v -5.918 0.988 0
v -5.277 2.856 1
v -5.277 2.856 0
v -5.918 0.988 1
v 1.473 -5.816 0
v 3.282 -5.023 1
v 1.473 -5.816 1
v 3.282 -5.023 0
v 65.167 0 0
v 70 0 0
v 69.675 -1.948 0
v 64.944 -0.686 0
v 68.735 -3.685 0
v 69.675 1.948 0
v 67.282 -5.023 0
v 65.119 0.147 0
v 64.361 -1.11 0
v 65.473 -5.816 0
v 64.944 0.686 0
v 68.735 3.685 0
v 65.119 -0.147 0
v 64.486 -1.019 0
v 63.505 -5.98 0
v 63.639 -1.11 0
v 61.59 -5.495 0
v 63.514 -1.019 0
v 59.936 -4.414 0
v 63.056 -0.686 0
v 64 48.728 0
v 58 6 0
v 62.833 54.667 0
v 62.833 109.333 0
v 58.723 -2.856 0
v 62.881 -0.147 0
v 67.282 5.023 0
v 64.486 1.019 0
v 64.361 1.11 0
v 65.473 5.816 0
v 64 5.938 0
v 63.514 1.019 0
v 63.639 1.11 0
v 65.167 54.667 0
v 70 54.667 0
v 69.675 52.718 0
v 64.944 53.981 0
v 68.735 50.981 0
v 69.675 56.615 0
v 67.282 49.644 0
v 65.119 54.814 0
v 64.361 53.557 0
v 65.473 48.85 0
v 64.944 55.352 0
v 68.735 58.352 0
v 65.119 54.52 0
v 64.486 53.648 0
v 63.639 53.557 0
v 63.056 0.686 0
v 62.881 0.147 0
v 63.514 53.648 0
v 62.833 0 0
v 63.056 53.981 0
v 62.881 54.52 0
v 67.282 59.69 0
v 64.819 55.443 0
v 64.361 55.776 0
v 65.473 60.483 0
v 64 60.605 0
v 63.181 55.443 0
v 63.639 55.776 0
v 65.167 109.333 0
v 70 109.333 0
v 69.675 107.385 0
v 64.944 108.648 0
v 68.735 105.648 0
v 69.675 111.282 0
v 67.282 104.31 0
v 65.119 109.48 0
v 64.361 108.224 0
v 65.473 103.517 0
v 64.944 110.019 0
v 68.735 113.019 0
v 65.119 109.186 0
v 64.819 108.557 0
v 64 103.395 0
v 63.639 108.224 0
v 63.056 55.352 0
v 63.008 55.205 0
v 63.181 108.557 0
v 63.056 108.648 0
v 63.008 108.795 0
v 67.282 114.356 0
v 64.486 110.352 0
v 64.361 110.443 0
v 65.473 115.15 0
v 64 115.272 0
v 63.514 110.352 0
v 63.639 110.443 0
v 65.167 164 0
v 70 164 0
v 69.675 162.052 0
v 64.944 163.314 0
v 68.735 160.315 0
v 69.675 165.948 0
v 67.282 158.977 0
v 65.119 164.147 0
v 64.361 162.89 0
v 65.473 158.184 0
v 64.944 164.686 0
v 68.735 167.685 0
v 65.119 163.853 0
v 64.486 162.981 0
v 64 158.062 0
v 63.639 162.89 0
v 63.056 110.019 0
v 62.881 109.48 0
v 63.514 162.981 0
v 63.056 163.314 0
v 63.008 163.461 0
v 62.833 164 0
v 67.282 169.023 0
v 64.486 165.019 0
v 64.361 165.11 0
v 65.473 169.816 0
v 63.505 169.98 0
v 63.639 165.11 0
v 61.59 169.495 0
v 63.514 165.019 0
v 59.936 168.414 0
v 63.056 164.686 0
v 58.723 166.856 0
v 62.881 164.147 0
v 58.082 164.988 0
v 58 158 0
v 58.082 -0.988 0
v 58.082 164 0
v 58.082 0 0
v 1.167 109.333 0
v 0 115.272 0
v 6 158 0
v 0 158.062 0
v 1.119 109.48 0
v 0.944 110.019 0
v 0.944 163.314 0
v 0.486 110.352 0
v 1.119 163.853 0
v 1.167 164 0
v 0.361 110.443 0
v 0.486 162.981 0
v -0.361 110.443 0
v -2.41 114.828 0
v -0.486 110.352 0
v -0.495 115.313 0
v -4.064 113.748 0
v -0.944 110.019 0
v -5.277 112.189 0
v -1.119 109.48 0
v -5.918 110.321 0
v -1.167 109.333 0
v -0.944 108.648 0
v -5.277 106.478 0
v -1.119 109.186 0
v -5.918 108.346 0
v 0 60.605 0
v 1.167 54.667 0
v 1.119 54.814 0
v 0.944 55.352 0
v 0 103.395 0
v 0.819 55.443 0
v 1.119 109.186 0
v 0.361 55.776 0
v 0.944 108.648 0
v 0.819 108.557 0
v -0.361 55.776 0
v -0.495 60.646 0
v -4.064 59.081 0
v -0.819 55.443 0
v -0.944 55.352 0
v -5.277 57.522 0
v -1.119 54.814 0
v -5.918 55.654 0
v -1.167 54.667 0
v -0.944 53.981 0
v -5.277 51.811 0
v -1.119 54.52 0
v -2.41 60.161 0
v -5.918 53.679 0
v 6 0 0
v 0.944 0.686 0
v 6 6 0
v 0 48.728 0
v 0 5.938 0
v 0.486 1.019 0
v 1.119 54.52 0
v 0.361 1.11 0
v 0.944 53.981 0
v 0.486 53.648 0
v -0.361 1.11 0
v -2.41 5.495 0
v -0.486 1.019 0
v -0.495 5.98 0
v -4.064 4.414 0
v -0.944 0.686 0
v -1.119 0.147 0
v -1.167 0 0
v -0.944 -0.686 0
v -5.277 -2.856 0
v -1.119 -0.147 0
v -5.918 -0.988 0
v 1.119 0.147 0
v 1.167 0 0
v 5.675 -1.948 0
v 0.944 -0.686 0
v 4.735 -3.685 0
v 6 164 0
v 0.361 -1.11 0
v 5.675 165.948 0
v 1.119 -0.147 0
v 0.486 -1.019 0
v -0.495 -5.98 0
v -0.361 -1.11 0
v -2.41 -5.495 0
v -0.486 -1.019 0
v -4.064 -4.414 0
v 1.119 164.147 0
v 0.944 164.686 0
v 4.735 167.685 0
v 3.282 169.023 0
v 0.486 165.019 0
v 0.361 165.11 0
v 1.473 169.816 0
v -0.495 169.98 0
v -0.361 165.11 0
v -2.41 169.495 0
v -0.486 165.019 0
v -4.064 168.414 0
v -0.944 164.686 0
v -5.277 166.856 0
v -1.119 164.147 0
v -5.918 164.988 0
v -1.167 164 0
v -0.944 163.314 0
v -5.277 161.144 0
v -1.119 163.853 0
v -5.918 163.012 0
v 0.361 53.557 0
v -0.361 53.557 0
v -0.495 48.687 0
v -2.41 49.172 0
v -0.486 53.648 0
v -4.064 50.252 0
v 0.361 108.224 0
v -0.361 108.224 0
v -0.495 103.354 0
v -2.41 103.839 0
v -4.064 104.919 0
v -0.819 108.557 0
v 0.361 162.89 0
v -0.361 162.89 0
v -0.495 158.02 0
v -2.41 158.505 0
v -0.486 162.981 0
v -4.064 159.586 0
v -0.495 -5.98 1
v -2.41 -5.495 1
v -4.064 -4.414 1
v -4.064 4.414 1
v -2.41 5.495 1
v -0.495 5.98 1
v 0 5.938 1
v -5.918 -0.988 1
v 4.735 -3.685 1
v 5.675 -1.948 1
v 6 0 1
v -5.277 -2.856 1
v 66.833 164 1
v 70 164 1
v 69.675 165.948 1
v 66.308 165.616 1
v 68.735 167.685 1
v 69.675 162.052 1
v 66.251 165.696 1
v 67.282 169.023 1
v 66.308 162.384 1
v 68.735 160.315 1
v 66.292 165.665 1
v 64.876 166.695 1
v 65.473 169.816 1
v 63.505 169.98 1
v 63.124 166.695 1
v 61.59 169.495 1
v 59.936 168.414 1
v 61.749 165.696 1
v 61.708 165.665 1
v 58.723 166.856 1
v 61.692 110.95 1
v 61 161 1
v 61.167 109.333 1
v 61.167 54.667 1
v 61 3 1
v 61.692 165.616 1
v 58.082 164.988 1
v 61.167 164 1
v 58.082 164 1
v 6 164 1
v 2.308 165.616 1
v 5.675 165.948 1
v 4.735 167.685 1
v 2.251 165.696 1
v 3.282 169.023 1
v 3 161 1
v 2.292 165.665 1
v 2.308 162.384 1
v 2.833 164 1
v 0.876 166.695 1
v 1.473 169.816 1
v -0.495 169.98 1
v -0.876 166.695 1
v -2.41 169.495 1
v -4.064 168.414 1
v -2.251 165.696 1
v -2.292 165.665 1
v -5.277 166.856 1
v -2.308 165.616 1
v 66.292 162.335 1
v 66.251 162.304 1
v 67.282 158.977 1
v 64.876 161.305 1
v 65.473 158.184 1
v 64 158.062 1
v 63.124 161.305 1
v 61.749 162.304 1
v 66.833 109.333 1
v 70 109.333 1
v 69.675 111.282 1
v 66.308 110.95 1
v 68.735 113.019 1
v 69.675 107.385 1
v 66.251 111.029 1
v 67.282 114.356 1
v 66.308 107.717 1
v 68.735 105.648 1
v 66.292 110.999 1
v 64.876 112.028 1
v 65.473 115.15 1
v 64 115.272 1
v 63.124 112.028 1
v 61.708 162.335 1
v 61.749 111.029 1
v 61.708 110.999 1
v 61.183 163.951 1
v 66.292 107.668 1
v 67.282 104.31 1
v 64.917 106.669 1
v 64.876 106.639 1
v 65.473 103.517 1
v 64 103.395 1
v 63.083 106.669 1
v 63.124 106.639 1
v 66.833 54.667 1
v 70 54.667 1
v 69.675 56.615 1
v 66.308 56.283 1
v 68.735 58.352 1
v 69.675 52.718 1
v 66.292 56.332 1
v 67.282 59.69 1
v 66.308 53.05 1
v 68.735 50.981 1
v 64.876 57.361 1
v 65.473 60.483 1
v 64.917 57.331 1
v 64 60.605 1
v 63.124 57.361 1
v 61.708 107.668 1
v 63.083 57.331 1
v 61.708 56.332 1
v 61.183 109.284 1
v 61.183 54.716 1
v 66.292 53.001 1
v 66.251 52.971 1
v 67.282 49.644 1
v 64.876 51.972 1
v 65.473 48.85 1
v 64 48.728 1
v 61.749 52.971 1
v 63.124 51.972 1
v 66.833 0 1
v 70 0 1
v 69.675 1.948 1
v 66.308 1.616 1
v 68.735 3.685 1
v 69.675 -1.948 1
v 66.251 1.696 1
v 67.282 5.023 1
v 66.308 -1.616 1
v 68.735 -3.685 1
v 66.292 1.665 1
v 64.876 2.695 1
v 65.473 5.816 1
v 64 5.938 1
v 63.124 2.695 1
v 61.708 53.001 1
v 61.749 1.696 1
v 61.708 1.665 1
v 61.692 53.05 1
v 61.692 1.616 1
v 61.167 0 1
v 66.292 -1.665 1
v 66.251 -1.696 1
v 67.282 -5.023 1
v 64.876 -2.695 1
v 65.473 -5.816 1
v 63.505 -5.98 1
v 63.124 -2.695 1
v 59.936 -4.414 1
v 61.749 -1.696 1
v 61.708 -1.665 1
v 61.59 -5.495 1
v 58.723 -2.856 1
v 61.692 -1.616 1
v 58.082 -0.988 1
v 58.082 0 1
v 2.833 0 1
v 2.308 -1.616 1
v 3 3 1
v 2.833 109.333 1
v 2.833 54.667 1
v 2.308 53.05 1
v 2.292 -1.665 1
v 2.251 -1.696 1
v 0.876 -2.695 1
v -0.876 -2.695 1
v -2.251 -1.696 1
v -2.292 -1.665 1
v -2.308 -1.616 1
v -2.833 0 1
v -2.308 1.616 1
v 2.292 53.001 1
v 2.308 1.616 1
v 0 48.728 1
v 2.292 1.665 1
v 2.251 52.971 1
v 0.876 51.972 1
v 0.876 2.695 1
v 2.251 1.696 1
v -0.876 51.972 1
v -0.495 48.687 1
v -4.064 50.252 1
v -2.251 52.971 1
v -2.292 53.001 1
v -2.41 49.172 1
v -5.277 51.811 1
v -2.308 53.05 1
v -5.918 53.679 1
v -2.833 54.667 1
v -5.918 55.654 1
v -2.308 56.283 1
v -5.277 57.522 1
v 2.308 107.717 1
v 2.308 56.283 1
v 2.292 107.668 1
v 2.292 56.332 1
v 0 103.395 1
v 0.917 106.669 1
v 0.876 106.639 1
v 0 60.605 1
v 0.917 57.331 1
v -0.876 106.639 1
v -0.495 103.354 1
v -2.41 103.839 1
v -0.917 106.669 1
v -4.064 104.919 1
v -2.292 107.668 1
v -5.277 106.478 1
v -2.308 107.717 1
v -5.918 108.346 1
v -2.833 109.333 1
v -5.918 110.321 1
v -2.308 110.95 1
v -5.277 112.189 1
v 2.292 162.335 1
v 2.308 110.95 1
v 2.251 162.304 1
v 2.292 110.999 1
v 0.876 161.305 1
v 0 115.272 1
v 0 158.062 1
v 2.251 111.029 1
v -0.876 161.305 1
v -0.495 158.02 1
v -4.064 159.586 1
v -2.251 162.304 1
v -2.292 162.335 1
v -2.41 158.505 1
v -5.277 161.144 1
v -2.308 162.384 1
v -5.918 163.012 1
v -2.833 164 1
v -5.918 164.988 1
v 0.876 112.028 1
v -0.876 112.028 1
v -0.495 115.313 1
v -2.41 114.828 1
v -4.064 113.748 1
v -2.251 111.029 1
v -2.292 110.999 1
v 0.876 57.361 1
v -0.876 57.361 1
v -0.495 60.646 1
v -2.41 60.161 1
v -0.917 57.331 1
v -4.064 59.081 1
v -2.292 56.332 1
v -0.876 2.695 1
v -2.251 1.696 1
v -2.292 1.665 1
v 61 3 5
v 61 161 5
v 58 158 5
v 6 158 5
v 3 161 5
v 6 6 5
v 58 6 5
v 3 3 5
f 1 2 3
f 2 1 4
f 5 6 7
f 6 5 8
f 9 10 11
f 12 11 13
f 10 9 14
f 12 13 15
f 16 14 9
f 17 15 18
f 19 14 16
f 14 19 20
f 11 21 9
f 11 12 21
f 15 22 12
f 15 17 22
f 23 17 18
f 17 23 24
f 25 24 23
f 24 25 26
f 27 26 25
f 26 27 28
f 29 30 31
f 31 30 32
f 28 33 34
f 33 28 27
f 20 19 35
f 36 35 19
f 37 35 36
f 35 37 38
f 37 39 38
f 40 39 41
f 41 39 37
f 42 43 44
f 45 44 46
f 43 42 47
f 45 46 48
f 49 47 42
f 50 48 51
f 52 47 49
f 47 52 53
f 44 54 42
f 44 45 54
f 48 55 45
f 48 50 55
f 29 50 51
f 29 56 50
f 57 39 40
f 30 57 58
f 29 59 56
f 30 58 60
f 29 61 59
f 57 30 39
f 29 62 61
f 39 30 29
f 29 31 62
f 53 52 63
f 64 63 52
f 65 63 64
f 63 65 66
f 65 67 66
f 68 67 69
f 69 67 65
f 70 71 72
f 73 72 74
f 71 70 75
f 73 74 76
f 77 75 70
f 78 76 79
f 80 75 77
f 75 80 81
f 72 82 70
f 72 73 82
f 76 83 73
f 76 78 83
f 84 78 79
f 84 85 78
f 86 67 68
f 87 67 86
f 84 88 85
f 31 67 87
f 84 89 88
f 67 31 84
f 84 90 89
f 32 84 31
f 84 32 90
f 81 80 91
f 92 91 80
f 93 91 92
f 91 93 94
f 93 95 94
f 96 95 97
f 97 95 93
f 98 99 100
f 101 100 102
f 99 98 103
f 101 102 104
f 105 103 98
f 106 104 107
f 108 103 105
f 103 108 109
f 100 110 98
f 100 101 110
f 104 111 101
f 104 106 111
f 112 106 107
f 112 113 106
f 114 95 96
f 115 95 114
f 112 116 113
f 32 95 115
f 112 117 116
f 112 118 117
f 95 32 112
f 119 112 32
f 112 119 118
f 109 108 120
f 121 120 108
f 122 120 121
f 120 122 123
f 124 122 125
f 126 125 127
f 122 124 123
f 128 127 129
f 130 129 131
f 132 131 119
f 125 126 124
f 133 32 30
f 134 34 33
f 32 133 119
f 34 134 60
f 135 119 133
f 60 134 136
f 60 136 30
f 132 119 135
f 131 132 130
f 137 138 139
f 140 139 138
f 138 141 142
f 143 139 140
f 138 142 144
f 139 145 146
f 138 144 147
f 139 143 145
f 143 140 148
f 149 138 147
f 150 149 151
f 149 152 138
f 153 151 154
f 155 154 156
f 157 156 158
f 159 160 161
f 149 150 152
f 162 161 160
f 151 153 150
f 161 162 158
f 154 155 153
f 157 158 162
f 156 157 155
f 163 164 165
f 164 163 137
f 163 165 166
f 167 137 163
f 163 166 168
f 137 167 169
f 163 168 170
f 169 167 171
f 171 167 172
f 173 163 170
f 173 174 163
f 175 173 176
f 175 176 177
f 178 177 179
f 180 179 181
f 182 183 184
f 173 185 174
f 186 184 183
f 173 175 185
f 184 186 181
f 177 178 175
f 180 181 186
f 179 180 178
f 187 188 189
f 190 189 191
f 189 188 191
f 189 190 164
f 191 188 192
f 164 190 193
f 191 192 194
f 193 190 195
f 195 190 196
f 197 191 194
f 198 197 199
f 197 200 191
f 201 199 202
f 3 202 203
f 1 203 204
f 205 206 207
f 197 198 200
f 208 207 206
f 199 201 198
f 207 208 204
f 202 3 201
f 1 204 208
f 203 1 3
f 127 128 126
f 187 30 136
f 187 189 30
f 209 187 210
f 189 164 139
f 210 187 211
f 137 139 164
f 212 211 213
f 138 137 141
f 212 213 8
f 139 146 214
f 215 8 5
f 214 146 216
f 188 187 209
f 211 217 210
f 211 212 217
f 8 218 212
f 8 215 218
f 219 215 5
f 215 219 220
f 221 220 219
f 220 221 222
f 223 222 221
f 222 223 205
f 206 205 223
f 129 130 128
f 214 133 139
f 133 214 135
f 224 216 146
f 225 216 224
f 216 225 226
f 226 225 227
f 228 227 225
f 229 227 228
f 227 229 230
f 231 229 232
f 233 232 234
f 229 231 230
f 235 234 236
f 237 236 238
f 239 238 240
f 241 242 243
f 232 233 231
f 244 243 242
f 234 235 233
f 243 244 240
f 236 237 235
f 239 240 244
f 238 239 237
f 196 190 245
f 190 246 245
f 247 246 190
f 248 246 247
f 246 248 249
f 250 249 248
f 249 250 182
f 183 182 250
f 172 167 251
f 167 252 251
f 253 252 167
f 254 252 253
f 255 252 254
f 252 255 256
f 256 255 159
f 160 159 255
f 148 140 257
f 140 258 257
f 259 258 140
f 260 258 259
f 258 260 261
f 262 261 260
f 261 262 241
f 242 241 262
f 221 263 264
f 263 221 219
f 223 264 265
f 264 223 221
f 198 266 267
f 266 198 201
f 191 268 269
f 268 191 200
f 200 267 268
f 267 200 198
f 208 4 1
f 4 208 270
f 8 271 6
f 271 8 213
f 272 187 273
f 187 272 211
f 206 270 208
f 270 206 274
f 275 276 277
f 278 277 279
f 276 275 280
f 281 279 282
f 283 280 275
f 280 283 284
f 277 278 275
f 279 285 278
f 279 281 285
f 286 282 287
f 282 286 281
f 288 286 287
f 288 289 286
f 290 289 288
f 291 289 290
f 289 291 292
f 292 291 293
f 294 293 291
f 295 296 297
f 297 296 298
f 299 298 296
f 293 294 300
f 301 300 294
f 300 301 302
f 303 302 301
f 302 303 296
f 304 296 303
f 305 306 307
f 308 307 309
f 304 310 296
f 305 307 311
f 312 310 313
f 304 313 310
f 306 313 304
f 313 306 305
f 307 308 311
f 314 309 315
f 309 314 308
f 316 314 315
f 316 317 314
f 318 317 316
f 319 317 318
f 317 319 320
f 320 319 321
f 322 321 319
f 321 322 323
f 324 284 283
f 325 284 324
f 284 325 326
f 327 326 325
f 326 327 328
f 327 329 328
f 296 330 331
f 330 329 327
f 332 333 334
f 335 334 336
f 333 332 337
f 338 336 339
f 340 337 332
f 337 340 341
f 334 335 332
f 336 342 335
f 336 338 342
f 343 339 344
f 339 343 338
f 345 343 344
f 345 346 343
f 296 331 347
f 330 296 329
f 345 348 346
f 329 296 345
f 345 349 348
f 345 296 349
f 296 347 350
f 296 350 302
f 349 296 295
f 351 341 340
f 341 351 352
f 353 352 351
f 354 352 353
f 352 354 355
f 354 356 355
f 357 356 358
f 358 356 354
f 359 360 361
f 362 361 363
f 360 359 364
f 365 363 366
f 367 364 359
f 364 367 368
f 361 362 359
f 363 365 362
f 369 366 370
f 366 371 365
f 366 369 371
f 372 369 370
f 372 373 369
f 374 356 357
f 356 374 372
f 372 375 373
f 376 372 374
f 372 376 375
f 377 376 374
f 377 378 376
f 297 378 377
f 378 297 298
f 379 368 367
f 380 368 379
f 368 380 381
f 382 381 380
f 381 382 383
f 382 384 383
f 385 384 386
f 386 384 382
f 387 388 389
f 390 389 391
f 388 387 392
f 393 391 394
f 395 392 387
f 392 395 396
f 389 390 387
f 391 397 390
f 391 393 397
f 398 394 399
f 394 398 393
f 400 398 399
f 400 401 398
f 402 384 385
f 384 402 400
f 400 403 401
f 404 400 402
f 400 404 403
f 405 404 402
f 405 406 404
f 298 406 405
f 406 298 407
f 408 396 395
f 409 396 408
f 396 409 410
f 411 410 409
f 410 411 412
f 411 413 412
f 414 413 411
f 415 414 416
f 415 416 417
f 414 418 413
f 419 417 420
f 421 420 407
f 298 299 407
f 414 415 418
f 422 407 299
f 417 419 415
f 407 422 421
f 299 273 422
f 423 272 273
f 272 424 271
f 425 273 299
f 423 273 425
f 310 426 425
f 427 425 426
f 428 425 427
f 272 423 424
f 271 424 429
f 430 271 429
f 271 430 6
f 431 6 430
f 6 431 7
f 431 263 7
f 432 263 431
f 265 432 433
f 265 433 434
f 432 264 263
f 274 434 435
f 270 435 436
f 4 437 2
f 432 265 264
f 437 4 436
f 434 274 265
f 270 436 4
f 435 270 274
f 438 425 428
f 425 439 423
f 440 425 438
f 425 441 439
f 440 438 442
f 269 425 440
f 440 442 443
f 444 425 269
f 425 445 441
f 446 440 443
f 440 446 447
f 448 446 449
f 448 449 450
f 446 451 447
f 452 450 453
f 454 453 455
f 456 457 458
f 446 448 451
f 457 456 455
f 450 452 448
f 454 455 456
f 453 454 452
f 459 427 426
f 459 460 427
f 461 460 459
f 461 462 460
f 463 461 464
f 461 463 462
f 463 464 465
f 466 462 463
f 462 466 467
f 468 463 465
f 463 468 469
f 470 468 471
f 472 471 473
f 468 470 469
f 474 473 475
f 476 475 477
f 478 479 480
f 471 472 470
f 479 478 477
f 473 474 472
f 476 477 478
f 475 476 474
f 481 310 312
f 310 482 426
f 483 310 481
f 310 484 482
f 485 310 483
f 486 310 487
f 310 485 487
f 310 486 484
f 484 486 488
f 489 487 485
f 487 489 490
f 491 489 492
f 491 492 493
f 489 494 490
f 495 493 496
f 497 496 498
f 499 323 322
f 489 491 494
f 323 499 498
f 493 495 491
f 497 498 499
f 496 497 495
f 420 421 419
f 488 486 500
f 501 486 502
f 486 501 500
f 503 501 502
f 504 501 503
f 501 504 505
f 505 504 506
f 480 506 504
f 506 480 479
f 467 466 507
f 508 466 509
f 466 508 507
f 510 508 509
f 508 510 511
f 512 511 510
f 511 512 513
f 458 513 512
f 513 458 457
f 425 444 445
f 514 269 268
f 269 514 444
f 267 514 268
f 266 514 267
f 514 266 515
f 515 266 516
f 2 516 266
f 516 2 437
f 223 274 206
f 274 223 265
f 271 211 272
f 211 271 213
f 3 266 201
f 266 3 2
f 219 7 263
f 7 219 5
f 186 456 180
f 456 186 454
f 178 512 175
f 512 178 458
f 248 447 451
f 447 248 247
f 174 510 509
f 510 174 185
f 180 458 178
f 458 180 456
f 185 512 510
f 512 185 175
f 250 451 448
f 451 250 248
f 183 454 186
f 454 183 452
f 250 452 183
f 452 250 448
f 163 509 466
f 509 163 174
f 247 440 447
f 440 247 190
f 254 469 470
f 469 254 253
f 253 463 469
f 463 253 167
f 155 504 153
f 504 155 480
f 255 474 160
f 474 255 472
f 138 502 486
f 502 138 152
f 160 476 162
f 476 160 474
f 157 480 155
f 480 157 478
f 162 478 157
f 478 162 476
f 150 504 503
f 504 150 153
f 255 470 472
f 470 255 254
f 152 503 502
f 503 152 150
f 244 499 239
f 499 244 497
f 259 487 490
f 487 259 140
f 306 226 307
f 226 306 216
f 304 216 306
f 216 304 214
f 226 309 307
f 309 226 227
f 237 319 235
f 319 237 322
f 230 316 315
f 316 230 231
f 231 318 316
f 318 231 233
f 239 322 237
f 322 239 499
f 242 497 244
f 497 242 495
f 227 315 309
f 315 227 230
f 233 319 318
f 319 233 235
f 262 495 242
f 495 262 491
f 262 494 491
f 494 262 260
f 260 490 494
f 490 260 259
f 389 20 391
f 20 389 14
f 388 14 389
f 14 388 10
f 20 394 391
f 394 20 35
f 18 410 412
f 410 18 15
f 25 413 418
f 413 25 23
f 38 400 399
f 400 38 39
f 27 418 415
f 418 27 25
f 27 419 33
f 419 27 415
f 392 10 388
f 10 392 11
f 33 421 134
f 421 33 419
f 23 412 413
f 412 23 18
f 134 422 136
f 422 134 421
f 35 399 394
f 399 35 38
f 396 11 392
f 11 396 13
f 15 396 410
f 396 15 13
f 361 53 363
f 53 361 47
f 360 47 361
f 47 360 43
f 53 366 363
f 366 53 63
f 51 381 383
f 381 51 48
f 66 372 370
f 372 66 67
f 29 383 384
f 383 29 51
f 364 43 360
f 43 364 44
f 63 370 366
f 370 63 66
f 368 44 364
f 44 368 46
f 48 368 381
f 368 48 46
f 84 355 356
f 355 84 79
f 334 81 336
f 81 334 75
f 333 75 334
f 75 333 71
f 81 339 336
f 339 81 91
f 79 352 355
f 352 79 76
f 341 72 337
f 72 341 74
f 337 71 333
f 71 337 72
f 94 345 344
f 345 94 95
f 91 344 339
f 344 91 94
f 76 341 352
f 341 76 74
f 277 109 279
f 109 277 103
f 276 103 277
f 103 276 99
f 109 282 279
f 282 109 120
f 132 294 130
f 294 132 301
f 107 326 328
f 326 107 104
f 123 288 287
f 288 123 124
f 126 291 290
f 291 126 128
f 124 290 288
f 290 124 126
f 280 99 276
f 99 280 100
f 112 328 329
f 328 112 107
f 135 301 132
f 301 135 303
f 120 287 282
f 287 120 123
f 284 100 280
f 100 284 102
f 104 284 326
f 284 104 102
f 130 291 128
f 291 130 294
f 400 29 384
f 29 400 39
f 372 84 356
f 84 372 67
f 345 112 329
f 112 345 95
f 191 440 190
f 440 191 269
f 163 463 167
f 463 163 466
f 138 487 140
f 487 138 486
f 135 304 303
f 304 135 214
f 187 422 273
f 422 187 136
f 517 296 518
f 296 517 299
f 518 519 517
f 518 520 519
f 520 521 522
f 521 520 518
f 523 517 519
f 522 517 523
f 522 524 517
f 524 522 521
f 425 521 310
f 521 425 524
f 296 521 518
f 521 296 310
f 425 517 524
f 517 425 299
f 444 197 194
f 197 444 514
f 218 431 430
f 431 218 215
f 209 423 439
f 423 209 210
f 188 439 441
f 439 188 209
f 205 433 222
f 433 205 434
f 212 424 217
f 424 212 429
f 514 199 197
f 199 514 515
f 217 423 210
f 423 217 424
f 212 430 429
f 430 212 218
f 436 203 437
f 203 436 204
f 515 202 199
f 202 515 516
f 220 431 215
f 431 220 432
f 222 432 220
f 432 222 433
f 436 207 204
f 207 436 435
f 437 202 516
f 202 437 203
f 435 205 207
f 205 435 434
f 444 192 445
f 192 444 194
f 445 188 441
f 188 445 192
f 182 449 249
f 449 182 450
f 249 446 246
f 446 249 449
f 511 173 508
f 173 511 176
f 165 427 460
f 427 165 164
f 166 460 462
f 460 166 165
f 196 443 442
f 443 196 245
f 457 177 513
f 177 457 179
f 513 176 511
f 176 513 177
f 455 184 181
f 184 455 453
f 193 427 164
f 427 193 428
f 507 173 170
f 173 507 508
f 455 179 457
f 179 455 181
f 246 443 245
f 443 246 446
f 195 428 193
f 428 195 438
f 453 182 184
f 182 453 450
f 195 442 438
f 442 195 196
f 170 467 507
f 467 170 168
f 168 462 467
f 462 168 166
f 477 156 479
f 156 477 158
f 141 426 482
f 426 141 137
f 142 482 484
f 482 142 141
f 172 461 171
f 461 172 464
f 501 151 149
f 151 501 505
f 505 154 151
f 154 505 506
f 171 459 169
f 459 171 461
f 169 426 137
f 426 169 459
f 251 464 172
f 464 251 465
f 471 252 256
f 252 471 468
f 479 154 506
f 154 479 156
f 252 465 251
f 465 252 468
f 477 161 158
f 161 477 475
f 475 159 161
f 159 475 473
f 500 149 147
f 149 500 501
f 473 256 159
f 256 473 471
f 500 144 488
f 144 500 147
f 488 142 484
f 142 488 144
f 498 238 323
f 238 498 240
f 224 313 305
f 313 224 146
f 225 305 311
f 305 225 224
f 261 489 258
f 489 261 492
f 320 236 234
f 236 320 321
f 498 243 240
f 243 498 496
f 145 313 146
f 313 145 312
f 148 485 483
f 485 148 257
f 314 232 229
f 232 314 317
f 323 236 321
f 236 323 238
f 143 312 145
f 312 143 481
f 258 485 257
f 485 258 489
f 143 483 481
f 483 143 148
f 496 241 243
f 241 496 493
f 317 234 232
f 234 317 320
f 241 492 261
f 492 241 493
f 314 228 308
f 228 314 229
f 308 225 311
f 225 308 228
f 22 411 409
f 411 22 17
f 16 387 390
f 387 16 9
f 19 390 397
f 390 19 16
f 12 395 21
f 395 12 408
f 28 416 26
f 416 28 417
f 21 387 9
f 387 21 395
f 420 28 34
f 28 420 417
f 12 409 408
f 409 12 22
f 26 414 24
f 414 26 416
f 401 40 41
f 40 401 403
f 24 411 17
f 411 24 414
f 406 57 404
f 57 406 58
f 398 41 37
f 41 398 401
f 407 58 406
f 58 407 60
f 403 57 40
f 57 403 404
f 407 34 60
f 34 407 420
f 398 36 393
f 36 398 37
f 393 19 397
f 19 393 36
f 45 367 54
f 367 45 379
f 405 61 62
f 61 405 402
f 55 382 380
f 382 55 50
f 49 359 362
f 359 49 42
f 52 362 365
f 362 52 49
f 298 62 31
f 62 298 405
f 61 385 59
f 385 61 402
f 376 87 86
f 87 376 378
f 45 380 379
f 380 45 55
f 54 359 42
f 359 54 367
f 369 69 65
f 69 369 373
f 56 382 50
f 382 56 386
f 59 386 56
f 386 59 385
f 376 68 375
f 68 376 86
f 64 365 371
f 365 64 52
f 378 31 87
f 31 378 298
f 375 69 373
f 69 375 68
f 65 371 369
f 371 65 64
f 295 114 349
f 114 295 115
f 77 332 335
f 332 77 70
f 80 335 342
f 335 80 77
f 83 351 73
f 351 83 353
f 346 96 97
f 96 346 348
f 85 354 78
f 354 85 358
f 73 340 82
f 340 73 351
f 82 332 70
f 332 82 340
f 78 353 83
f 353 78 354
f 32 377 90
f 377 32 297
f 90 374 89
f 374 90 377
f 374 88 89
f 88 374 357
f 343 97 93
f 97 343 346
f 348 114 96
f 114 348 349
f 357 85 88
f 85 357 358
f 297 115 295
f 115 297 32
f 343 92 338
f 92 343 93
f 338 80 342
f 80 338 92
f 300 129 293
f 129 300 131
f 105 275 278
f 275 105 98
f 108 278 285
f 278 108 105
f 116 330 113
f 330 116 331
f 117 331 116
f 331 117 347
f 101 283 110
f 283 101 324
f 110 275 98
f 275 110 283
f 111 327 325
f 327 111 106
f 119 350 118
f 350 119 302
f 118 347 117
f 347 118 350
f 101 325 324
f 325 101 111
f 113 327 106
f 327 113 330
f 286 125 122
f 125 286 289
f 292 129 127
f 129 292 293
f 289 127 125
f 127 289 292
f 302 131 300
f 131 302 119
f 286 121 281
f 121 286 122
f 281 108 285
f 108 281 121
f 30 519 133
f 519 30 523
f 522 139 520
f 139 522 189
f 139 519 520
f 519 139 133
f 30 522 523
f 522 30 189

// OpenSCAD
// steady border
// https://github.com/davidelliott/parametric-lab 
// License: CC-BY

// This design is for a border which can be easily taped or screwed
// down to keep items steady
// The edge width can be varied according to the width of tape being
// used, and the tabs with screw holes are optional.

// TODO
// option to include an interior floor might be useful

///////////////////////////
// Adjustable parameters //
///////////////////////////
x=52; // size of main hole x dimension
y=152; // size of main hole y dimension
z=5; // size of main hole z dimension
wall=3; // width of main wall
edge=6; // width of flat area outside of main wall which is meant for sticking tape to
edge_z=1; // height of flat area
tab_x=2; // number of tabs along x walls
tab_y=4; // number of tabs along y walls

// Calculate some dimensions
base_x=x+(2*edge);
base_y=y+(2*edge);
tab_x_step=base_x/(max(tab_x-1,1)); // max() is used to avoid having
tab_y_step=base_y/(max(tab_y-1,1)); // step of infinity when only 1 tab specified

// Build the object
difference(){
union(){

// flat base
cube([base_x,base_y,edge_z]);

// raised centre
translate([edge-wall,edge-wall,0]){
cube([x+(2*wall),y+(2*wall),z]);
}

// tabs
if(tab_x+tab_y>0){
for(xx=[0:max(tab_x-1,0)]) {
for(yy=[0:max(tab_y-1,0)]) {
translate([xx*tab_x_step,yy*tab_y_step,0]){
cylinder(r=edge,h=edge_z);
}
}
}
}
} // end of union
// Following parts are subtracted

// cut out hole
translate([edge,edge,-1]){
cube([x,y,z+2]);
}

// cut out screw holes in tabs

if(tab_x+tab_y>0){
for(xx=[0:tab_x-1]) {
for(yy=[0:tab_y-1]) {
translate([xx*tab_x_step,yy*tab_y_step,-0.1]){
cylinder(r1=1,r2=3,h=edge_z+0.2);
}
}
}
}

} // end of difference
